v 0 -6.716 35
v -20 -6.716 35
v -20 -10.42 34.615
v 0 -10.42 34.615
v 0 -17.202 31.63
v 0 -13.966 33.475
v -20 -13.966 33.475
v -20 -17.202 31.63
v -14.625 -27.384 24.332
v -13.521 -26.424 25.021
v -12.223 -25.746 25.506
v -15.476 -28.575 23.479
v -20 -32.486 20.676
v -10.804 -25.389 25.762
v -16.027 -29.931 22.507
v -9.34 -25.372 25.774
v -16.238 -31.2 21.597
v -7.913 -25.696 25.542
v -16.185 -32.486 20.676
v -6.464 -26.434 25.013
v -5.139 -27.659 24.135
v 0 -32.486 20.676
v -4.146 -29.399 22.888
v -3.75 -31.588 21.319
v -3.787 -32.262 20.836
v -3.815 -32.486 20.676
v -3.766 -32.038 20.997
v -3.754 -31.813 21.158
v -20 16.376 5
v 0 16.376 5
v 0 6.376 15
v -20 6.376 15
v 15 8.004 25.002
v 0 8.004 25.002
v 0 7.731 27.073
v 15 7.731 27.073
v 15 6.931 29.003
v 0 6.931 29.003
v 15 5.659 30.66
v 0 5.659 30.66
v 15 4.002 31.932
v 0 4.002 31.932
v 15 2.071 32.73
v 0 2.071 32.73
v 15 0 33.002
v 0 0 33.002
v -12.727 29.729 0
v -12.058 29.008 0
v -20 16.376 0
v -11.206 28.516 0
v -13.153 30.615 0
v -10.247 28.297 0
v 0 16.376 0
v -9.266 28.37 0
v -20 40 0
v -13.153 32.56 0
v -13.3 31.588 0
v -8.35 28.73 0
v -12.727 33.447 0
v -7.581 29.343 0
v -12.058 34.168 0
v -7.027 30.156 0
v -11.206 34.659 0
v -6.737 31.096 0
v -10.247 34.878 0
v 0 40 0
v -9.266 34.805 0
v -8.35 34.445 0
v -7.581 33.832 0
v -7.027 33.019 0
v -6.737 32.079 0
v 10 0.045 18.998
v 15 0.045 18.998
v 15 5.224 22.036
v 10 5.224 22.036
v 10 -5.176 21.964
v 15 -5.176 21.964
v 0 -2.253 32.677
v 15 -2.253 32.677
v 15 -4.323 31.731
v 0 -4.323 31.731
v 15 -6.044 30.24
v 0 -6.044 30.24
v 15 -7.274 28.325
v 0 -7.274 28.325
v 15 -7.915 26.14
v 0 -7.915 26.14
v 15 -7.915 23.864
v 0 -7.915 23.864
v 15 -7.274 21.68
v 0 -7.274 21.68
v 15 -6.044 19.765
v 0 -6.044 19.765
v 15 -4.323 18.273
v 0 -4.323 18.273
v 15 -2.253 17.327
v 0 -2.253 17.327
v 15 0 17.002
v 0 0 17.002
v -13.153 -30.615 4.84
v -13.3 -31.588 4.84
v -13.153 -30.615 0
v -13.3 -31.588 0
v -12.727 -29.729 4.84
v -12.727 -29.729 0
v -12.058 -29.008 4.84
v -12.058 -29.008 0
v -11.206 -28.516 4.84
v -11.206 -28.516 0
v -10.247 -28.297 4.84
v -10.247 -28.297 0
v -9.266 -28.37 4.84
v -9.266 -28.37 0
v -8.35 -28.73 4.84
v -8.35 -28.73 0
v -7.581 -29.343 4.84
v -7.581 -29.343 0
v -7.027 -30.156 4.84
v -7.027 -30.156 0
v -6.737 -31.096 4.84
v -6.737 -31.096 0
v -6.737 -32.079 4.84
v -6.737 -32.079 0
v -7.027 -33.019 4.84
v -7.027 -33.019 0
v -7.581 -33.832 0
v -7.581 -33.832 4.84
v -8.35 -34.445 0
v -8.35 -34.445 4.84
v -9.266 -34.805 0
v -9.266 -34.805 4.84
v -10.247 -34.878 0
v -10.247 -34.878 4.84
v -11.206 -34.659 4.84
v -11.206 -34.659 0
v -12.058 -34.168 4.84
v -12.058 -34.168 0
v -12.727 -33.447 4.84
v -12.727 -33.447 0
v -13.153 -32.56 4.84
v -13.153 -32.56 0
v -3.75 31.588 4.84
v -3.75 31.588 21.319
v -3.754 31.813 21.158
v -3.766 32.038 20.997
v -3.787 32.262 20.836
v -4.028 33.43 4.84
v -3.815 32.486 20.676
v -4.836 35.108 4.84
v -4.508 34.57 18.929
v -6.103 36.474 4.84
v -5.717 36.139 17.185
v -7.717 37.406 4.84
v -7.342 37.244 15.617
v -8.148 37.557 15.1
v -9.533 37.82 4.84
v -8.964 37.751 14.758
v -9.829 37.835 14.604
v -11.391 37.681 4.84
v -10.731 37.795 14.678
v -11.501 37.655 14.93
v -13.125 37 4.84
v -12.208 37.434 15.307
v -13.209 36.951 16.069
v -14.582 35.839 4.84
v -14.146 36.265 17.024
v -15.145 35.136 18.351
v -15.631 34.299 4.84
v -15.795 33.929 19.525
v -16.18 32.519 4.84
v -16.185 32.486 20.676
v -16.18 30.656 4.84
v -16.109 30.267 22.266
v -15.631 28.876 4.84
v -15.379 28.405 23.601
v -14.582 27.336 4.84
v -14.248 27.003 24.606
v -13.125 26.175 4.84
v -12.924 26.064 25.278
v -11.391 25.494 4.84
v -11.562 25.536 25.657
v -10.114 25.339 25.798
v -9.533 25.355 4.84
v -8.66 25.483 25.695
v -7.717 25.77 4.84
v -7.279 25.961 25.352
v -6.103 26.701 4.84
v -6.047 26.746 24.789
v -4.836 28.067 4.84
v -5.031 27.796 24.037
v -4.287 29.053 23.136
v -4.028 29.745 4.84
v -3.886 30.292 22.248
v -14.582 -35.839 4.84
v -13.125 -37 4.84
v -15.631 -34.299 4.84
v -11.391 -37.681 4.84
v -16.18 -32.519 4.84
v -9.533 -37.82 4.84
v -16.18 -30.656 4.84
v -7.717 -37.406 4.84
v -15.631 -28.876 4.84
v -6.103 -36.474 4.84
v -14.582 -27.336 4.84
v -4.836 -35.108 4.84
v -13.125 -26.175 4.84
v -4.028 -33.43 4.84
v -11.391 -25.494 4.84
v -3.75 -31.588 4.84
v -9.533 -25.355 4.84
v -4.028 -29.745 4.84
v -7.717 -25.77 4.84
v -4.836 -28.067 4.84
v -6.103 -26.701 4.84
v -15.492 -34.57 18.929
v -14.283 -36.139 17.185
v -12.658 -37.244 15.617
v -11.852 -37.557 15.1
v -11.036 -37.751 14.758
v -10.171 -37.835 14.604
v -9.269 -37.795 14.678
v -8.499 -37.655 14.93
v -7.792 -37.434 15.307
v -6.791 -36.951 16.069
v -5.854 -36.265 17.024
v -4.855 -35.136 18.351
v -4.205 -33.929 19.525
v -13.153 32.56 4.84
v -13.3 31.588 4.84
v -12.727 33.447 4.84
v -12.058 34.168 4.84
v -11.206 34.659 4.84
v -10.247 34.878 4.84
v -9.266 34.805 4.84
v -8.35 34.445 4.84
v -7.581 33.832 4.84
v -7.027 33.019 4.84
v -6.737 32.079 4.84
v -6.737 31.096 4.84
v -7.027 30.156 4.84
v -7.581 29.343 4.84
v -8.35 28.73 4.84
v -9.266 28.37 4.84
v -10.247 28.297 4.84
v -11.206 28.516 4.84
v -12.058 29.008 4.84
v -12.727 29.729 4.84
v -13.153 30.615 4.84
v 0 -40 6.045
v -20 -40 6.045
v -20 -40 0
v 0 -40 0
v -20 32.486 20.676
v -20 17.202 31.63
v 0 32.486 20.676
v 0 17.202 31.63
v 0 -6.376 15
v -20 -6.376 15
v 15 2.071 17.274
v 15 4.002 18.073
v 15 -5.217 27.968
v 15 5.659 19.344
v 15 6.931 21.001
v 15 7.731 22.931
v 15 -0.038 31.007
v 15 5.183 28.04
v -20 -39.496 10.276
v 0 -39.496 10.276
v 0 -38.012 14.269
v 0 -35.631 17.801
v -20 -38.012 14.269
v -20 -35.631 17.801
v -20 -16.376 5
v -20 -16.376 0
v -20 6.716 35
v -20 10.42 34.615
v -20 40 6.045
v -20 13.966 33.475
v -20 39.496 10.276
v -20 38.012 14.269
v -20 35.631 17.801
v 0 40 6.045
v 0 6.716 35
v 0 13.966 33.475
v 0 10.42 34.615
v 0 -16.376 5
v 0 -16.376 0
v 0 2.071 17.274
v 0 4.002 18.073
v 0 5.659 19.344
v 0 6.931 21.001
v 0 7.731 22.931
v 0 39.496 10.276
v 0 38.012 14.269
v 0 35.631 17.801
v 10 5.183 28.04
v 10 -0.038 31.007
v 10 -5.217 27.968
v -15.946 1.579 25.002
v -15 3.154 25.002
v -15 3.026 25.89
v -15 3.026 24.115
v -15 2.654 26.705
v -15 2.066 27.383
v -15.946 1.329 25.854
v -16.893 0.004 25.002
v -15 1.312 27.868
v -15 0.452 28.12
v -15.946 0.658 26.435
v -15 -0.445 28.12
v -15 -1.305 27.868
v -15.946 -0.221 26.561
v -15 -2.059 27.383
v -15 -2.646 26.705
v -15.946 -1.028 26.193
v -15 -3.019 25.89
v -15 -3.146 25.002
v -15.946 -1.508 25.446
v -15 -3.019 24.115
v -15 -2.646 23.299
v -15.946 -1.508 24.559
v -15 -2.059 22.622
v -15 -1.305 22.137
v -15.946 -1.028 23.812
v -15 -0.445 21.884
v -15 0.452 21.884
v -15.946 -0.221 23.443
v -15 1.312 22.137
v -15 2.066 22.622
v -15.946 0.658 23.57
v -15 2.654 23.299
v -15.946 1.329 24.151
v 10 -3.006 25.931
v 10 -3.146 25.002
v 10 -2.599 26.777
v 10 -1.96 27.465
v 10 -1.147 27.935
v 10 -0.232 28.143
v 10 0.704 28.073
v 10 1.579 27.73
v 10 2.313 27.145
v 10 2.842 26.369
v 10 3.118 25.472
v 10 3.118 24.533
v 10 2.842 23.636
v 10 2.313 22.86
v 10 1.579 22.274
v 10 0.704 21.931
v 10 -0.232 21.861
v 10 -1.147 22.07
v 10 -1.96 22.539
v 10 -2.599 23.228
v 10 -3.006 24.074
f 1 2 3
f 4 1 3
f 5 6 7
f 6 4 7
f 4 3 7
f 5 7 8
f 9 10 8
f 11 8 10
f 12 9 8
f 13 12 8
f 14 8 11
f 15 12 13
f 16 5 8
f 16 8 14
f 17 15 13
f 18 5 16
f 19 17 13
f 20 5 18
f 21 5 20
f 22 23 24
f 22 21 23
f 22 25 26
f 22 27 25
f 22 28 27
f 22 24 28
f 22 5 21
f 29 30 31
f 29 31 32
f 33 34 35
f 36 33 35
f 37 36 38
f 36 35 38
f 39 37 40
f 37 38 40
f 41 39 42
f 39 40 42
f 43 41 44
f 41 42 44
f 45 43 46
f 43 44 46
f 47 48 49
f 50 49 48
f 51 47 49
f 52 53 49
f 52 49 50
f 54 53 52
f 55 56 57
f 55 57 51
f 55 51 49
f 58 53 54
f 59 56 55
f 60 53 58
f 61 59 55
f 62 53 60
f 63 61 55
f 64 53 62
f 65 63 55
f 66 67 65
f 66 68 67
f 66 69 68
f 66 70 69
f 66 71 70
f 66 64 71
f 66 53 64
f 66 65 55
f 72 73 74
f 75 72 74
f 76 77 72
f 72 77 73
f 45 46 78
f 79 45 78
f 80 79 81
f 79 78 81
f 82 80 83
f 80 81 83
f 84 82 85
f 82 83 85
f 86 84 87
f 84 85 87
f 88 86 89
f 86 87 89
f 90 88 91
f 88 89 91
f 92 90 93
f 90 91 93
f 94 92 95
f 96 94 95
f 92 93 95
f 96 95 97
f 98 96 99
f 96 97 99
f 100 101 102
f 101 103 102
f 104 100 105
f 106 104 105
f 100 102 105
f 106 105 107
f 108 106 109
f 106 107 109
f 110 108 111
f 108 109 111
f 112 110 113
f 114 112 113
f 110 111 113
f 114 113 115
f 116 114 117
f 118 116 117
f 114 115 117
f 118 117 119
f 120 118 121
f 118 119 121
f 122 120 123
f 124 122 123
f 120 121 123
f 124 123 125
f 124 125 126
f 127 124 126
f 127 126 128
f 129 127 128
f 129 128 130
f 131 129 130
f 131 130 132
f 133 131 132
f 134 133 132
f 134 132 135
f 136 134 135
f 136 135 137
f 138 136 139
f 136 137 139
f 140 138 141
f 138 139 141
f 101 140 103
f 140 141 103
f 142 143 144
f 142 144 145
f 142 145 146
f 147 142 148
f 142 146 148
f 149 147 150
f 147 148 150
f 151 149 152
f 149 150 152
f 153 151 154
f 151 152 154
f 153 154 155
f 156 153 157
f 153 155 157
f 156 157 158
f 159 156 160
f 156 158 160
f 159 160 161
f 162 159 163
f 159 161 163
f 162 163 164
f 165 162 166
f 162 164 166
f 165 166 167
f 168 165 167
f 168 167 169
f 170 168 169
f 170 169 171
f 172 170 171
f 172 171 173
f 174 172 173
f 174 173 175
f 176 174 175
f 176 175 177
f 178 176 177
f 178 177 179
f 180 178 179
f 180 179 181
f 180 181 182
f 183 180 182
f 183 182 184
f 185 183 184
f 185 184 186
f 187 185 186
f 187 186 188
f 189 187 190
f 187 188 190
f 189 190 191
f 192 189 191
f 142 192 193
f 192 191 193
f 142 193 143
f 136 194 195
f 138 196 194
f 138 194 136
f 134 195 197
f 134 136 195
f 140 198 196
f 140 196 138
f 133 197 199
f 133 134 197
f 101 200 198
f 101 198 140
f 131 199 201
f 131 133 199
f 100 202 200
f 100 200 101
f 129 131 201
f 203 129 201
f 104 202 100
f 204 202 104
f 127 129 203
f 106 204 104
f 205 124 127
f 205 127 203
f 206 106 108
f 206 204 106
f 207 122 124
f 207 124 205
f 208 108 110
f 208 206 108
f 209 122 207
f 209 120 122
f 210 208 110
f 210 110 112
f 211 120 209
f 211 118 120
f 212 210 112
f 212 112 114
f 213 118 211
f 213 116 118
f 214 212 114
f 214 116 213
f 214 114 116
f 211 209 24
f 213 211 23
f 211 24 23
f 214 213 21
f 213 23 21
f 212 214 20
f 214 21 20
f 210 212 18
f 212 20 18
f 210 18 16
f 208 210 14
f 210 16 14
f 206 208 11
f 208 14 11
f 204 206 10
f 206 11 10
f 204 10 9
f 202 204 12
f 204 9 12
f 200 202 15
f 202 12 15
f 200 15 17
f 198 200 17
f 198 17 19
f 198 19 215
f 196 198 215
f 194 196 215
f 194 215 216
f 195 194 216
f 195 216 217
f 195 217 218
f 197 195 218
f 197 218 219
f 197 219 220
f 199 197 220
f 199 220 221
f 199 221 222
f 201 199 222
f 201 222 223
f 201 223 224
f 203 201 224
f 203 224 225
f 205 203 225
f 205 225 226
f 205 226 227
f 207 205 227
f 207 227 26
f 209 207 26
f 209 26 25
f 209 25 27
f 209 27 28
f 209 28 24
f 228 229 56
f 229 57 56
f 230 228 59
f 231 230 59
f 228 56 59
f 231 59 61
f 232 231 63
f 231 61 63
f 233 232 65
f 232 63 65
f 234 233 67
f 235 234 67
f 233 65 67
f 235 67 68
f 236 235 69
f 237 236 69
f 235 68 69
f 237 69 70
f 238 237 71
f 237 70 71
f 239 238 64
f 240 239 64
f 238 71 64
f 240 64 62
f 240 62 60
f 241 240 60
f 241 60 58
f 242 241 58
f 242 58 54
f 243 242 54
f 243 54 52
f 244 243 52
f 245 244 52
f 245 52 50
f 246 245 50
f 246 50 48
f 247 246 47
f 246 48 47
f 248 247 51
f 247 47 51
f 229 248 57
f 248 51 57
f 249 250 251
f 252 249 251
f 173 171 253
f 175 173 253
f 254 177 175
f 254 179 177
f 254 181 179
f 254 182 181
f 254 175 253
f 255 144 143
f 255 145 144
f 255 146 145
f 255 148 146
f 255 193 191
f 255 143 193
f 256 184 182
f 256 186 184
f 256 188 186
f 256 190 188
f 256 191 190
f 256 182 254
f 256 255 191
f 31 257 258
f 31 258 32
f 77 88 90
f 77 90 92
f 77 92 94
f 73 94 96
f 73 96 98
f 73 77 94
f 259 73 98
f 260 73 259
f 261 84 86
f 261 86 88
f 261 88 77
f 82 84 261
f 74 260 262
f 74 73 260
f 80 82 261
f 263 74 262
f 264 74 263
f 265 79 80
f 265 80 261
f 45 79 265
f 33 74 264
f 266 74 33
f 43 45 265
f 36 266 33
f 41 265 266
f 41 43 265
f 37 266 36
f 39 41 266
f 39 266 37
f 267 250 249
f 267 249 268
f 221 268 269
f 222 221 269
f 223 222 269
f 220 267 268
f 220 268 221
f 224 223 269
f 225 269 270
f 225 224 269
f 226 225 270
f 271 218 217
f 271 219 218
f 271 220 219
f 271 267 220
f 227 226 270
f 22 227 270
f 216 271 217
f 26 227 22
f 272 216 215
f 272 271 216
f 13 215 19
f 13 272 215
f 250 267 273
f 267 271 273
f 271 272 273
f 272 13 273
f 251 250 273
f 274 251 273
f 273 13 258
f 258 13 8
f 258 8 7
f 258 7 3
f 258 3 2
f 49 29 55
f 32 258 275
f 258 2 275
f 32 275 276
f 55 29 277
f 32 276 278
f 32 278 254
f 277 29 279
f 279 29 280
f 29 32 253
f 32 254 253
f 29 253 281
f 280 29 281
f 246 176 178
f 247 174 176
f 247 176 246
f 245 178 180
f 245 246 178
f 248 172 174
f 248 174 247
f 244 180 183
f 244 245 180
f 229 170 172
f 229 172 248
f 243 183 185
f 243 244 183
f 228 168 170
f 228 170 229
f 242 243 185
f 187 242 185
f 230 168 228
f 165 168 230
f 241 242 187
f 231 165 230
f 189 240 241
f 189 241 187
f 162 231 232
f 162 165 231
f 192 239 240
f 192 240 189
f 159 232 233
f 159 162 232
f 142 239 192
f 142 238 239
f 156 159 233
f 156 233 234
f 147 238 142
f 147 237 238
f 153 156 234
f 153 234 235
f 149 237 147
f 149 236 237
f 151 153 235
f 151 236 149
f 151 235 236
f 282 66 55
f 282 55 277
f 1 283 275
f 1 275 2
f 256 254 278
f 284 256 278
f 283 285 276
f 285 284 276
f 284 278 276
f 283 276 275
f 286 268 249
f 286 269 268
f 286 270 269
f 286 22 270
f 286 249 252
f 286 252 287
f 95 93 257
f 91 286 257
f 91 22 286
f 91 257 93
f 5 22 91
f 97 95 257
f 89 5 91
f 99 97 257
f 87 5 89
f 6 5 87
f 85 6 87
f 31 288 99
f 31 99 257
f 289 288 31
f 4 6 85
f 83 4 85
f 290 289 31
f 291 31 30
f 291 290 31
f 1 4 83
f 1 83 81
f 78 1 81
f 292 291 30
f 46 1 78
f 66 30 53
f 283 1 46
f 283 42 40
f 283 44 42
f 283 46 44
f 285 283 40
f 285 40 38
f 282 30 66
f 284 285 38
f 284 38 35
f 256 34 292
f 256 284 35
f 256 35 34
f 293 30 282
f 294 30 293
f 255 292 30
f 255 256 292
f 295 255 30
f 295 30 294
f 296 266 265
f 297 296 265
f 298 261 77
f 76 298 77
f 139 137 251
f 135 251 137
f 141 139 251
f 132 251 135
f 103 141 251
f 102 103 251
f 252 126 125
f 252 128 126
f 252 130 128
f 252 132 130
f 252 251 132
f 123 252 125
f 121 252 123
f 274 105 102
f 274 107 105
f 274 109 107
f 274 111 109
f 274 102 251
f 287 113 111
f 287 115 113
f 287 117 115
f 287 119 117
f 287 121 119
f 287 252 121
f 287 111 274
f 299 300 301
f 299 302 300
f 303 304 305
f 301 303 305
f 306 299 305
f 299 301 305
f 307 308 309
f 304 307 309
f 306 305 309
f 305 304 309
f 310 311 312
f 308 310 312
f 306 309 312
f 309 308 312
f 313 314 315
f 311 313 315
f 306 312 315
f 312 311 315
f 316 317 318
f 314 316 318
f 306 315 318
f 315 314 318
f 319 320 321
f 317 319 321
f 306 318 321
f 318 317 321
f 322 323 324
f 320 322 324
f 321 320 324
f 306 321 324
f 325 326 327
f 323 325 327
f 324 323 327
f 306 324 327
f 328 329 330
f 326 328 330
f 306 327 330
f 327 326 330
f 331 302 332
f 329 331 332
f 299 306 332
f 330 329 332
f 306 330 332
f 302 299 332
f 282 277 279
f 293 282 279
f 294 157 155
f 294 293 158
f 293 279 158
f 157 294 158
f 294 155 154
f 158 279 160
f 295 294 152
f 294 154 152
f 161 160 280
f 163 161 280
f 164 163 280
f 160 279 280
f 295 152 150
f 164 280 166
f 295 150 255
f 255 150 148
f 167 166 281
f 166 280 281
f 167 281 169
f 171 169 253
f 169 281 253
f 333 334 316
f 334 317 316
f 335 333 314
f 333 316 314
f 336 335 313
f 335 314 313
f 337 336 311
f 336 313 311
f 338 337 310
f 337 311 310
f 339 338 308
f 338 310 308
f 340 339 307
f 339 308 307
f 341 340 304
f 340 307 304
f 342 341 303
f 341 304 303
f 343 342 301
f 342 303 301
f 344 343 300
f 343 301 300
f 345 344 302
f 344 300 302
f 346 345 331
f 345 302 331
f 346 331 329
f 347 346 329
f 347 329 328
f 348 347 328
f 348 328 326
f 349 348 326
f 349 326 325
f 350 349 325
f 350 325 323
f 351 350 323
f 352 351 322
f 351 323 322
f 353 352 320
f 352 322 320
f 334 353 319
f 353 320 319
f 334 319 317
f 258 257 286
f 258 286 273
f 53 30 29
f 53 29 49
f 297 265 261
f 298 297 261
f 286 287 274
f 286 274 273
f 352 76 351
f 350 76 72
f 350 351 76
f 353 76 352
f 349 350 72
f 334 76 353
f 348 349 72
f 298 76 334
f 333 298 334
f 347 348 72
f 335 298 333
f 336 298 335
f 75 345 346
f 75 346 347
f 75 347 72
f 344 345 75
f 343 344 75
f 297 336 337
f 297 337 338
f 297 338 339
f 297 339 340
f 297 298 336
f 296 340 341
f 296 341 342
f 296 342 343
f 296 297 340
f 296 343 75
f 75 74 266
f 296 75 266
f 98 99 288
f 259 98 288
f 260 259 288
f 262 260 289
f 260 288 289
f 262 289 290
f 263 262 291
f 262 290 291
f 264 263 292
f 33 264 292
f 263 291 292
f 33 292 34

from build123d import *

# Parameters (mm, degrees)
F1_DEPTH       = 20
F3_DEPTH       = 15
F5_D           = 6.3
F5_DEPTH       = 30
F5_TIP         = 1.8927109499
F6_DEPTH       = 5
F8_D           = 6.6
F8_DEPTH       = 21
F8_START       = 18.1600674
F8_CBORE_D     = 12.5
F8_CBORE_DEPTH = 12
F8_TIP         = 1.9828400428
F9_T1_DEPTH    = 66.2237980807
F9_T3_DEPTH    = 48.9219521717
F10_SIZE       = 10


# Not quite as in the source:
# - a fillet or chamfer that OpenCascade refuses, or shapes differently, is made with other operations: its cross-section is extruded or revolved along the edge and cut away or added


with BuildPart() as f1:
    # F0 (on Right) → F1 (new body)
    with BuildSketch(Plane.YZ):
        Polygon((-16.375976861, 0), (-16.375976861, 10), (-16.375976861, 15), (16.375976861, 15), (16.375976861, 10), (16.375976861, 0), (40, 0), (40, 15.2900453504), (12.5, 35), (0, 35), (-12.5, 35), (-40, 15.2900453504), (-40, 0), align=None)
    extrude(amount=-F1_DEPTH)

    # F2 (on face) → F3 (join)
    with BuildSketch(Plane.YZ):
        with BuildLine():
            ThreePointArc((0, 17.0022554452), (5.6591519034, 19.3441438406), (8.0035544985, 25.0022546555))
            ThreePointArc((8.0035544985, 25.0022546555), (5.6591519034, 30.6603654705), (0, 33.0022538659))
            Line((0, 33.0022538659), (0, 17.0022554452))
        make_face()
        with BuildLine():
            Line((0, 17.0022554452), (0, 33.0022538659))
            ThreePointArc((0, 33.0022538659), (-7.9964455015, 25.0022546555), (0, 17.0022554452))
        make_face()
    extrude(amount=F3_DEPTH)

    # F5
    with Locations(Plane.YZ.offset(15)):
        with Locations((0.0035544985, 25.0022546555)):
            Hole(F5_D / 2, depth=F5_DEPTH)
            with Locations((0, 0, -(F5_DEPTH + F5_TIP / 2))):  # 118° drill point
                Cone(0, F5_D / 2, F5_TIP, mode=Mode.SUBTRACT)

    # F4 (on face) → F6 (cut)
    with BuildSketch(Plane.YZ.offset(15)):
        Polygon((5.1826206219, 28.040446128), (-0.0380634364, 31.0065532225), (-5.2171295598, 27.9683617501), (-5.1755116248, 21.9640631831), (0.0451724335, 18.9979560886), (5.2242385569, 22.036147561), align=None)
    extrude(amount=-F6_DEPTH, mode=Mode.SUBTRACT)

    # F8
    # its depths count from where the whole tool has entered the part; down to there all is cleared
    with Locations(Plane.XY.offset(35).offset(-F8_START)):
        with Locations((-10, 31.5875445392), (-10, -31.5875445392)):
            CounterBoreHole(F8_D / 2, F8_CBORE_D / 2, F8_CBORE_DEPTH, depth=F8_DEPTH)
            with Locations((0, 0, -(F8_DEPTH + F8_TIP / 2))):  # 118° drill point
                Cone(0, F8_D / 2, F8_TIP, mode=Mode.SUBTRACT)

    # F9: fillet of radius 18 on 4 edges, made by hand

    # F9_s2 → F9_t1 (cut)
    with BuildSketch(Plane.YZ.offset(-43.1118990403)):
        with BuildLine():
            ThreePointArc((40, 6.0452857343), (38.0116581667, 14.2688374458), (32.4859108054, 20.6755856144))
            Line((32.4859108054, 20.6755856144), (40, 15.2900453504))
            Line((40, 15.2900453504), (40, 6.0452857343))
        make_face()
        with BuildLine():
            ThreePointArc((-40, 6.0452857343), (-38.0116581667, 14.2688374458), (-32.4859108054, 20.6755856144))
            Line((-32.4859108054, 20.6755856144), (-40, 15.2900453504))
            Line((-40, 15.2900453504), (-40, 6.0452857343))
        make_face()
    extrude(amount=F9_T1_DEPTH, mode=Mode.SUBTRACT)

    # F9_s4 → F9_t3 (cut)
    with BuildSketch(Plane.YZ.offset(-34.4609760859)):
        with BuildLine():
            ThreePointArc((17.201520371, 31.6302998801), (12.2226324527, 34.1368812484), (6.7156095657, 35))
            Line((6.7156095657, 35), (12.5, 35))
            Line((12.5, 35), (17.201520371, 31.6302998801))
        make_face()
        with BuildLine():
            ThreePointArc((-6.7156095657, 35), (-12.2226324527, 34.1368812484), (-17.201520371, 31.6302998801))
            Line((-17.201520371, 31.6302998801), (-12.5, 35))
            Line((-12.5, 35), (-6.7156095657, 35))
        make_face()
    extrude(amount=F9_T3_DEPTH, mode=Mode.SUBTRACT)

    # F10
    f10_edges = [f1.edges().sort_by_distance(p)[0] for p in [
        (-10, 16.375977, 15),
        (-10, -16.375977, 15),
    ]]
    chamfer(f10_edges, length=F10_SIZE)


solid = f1.part
